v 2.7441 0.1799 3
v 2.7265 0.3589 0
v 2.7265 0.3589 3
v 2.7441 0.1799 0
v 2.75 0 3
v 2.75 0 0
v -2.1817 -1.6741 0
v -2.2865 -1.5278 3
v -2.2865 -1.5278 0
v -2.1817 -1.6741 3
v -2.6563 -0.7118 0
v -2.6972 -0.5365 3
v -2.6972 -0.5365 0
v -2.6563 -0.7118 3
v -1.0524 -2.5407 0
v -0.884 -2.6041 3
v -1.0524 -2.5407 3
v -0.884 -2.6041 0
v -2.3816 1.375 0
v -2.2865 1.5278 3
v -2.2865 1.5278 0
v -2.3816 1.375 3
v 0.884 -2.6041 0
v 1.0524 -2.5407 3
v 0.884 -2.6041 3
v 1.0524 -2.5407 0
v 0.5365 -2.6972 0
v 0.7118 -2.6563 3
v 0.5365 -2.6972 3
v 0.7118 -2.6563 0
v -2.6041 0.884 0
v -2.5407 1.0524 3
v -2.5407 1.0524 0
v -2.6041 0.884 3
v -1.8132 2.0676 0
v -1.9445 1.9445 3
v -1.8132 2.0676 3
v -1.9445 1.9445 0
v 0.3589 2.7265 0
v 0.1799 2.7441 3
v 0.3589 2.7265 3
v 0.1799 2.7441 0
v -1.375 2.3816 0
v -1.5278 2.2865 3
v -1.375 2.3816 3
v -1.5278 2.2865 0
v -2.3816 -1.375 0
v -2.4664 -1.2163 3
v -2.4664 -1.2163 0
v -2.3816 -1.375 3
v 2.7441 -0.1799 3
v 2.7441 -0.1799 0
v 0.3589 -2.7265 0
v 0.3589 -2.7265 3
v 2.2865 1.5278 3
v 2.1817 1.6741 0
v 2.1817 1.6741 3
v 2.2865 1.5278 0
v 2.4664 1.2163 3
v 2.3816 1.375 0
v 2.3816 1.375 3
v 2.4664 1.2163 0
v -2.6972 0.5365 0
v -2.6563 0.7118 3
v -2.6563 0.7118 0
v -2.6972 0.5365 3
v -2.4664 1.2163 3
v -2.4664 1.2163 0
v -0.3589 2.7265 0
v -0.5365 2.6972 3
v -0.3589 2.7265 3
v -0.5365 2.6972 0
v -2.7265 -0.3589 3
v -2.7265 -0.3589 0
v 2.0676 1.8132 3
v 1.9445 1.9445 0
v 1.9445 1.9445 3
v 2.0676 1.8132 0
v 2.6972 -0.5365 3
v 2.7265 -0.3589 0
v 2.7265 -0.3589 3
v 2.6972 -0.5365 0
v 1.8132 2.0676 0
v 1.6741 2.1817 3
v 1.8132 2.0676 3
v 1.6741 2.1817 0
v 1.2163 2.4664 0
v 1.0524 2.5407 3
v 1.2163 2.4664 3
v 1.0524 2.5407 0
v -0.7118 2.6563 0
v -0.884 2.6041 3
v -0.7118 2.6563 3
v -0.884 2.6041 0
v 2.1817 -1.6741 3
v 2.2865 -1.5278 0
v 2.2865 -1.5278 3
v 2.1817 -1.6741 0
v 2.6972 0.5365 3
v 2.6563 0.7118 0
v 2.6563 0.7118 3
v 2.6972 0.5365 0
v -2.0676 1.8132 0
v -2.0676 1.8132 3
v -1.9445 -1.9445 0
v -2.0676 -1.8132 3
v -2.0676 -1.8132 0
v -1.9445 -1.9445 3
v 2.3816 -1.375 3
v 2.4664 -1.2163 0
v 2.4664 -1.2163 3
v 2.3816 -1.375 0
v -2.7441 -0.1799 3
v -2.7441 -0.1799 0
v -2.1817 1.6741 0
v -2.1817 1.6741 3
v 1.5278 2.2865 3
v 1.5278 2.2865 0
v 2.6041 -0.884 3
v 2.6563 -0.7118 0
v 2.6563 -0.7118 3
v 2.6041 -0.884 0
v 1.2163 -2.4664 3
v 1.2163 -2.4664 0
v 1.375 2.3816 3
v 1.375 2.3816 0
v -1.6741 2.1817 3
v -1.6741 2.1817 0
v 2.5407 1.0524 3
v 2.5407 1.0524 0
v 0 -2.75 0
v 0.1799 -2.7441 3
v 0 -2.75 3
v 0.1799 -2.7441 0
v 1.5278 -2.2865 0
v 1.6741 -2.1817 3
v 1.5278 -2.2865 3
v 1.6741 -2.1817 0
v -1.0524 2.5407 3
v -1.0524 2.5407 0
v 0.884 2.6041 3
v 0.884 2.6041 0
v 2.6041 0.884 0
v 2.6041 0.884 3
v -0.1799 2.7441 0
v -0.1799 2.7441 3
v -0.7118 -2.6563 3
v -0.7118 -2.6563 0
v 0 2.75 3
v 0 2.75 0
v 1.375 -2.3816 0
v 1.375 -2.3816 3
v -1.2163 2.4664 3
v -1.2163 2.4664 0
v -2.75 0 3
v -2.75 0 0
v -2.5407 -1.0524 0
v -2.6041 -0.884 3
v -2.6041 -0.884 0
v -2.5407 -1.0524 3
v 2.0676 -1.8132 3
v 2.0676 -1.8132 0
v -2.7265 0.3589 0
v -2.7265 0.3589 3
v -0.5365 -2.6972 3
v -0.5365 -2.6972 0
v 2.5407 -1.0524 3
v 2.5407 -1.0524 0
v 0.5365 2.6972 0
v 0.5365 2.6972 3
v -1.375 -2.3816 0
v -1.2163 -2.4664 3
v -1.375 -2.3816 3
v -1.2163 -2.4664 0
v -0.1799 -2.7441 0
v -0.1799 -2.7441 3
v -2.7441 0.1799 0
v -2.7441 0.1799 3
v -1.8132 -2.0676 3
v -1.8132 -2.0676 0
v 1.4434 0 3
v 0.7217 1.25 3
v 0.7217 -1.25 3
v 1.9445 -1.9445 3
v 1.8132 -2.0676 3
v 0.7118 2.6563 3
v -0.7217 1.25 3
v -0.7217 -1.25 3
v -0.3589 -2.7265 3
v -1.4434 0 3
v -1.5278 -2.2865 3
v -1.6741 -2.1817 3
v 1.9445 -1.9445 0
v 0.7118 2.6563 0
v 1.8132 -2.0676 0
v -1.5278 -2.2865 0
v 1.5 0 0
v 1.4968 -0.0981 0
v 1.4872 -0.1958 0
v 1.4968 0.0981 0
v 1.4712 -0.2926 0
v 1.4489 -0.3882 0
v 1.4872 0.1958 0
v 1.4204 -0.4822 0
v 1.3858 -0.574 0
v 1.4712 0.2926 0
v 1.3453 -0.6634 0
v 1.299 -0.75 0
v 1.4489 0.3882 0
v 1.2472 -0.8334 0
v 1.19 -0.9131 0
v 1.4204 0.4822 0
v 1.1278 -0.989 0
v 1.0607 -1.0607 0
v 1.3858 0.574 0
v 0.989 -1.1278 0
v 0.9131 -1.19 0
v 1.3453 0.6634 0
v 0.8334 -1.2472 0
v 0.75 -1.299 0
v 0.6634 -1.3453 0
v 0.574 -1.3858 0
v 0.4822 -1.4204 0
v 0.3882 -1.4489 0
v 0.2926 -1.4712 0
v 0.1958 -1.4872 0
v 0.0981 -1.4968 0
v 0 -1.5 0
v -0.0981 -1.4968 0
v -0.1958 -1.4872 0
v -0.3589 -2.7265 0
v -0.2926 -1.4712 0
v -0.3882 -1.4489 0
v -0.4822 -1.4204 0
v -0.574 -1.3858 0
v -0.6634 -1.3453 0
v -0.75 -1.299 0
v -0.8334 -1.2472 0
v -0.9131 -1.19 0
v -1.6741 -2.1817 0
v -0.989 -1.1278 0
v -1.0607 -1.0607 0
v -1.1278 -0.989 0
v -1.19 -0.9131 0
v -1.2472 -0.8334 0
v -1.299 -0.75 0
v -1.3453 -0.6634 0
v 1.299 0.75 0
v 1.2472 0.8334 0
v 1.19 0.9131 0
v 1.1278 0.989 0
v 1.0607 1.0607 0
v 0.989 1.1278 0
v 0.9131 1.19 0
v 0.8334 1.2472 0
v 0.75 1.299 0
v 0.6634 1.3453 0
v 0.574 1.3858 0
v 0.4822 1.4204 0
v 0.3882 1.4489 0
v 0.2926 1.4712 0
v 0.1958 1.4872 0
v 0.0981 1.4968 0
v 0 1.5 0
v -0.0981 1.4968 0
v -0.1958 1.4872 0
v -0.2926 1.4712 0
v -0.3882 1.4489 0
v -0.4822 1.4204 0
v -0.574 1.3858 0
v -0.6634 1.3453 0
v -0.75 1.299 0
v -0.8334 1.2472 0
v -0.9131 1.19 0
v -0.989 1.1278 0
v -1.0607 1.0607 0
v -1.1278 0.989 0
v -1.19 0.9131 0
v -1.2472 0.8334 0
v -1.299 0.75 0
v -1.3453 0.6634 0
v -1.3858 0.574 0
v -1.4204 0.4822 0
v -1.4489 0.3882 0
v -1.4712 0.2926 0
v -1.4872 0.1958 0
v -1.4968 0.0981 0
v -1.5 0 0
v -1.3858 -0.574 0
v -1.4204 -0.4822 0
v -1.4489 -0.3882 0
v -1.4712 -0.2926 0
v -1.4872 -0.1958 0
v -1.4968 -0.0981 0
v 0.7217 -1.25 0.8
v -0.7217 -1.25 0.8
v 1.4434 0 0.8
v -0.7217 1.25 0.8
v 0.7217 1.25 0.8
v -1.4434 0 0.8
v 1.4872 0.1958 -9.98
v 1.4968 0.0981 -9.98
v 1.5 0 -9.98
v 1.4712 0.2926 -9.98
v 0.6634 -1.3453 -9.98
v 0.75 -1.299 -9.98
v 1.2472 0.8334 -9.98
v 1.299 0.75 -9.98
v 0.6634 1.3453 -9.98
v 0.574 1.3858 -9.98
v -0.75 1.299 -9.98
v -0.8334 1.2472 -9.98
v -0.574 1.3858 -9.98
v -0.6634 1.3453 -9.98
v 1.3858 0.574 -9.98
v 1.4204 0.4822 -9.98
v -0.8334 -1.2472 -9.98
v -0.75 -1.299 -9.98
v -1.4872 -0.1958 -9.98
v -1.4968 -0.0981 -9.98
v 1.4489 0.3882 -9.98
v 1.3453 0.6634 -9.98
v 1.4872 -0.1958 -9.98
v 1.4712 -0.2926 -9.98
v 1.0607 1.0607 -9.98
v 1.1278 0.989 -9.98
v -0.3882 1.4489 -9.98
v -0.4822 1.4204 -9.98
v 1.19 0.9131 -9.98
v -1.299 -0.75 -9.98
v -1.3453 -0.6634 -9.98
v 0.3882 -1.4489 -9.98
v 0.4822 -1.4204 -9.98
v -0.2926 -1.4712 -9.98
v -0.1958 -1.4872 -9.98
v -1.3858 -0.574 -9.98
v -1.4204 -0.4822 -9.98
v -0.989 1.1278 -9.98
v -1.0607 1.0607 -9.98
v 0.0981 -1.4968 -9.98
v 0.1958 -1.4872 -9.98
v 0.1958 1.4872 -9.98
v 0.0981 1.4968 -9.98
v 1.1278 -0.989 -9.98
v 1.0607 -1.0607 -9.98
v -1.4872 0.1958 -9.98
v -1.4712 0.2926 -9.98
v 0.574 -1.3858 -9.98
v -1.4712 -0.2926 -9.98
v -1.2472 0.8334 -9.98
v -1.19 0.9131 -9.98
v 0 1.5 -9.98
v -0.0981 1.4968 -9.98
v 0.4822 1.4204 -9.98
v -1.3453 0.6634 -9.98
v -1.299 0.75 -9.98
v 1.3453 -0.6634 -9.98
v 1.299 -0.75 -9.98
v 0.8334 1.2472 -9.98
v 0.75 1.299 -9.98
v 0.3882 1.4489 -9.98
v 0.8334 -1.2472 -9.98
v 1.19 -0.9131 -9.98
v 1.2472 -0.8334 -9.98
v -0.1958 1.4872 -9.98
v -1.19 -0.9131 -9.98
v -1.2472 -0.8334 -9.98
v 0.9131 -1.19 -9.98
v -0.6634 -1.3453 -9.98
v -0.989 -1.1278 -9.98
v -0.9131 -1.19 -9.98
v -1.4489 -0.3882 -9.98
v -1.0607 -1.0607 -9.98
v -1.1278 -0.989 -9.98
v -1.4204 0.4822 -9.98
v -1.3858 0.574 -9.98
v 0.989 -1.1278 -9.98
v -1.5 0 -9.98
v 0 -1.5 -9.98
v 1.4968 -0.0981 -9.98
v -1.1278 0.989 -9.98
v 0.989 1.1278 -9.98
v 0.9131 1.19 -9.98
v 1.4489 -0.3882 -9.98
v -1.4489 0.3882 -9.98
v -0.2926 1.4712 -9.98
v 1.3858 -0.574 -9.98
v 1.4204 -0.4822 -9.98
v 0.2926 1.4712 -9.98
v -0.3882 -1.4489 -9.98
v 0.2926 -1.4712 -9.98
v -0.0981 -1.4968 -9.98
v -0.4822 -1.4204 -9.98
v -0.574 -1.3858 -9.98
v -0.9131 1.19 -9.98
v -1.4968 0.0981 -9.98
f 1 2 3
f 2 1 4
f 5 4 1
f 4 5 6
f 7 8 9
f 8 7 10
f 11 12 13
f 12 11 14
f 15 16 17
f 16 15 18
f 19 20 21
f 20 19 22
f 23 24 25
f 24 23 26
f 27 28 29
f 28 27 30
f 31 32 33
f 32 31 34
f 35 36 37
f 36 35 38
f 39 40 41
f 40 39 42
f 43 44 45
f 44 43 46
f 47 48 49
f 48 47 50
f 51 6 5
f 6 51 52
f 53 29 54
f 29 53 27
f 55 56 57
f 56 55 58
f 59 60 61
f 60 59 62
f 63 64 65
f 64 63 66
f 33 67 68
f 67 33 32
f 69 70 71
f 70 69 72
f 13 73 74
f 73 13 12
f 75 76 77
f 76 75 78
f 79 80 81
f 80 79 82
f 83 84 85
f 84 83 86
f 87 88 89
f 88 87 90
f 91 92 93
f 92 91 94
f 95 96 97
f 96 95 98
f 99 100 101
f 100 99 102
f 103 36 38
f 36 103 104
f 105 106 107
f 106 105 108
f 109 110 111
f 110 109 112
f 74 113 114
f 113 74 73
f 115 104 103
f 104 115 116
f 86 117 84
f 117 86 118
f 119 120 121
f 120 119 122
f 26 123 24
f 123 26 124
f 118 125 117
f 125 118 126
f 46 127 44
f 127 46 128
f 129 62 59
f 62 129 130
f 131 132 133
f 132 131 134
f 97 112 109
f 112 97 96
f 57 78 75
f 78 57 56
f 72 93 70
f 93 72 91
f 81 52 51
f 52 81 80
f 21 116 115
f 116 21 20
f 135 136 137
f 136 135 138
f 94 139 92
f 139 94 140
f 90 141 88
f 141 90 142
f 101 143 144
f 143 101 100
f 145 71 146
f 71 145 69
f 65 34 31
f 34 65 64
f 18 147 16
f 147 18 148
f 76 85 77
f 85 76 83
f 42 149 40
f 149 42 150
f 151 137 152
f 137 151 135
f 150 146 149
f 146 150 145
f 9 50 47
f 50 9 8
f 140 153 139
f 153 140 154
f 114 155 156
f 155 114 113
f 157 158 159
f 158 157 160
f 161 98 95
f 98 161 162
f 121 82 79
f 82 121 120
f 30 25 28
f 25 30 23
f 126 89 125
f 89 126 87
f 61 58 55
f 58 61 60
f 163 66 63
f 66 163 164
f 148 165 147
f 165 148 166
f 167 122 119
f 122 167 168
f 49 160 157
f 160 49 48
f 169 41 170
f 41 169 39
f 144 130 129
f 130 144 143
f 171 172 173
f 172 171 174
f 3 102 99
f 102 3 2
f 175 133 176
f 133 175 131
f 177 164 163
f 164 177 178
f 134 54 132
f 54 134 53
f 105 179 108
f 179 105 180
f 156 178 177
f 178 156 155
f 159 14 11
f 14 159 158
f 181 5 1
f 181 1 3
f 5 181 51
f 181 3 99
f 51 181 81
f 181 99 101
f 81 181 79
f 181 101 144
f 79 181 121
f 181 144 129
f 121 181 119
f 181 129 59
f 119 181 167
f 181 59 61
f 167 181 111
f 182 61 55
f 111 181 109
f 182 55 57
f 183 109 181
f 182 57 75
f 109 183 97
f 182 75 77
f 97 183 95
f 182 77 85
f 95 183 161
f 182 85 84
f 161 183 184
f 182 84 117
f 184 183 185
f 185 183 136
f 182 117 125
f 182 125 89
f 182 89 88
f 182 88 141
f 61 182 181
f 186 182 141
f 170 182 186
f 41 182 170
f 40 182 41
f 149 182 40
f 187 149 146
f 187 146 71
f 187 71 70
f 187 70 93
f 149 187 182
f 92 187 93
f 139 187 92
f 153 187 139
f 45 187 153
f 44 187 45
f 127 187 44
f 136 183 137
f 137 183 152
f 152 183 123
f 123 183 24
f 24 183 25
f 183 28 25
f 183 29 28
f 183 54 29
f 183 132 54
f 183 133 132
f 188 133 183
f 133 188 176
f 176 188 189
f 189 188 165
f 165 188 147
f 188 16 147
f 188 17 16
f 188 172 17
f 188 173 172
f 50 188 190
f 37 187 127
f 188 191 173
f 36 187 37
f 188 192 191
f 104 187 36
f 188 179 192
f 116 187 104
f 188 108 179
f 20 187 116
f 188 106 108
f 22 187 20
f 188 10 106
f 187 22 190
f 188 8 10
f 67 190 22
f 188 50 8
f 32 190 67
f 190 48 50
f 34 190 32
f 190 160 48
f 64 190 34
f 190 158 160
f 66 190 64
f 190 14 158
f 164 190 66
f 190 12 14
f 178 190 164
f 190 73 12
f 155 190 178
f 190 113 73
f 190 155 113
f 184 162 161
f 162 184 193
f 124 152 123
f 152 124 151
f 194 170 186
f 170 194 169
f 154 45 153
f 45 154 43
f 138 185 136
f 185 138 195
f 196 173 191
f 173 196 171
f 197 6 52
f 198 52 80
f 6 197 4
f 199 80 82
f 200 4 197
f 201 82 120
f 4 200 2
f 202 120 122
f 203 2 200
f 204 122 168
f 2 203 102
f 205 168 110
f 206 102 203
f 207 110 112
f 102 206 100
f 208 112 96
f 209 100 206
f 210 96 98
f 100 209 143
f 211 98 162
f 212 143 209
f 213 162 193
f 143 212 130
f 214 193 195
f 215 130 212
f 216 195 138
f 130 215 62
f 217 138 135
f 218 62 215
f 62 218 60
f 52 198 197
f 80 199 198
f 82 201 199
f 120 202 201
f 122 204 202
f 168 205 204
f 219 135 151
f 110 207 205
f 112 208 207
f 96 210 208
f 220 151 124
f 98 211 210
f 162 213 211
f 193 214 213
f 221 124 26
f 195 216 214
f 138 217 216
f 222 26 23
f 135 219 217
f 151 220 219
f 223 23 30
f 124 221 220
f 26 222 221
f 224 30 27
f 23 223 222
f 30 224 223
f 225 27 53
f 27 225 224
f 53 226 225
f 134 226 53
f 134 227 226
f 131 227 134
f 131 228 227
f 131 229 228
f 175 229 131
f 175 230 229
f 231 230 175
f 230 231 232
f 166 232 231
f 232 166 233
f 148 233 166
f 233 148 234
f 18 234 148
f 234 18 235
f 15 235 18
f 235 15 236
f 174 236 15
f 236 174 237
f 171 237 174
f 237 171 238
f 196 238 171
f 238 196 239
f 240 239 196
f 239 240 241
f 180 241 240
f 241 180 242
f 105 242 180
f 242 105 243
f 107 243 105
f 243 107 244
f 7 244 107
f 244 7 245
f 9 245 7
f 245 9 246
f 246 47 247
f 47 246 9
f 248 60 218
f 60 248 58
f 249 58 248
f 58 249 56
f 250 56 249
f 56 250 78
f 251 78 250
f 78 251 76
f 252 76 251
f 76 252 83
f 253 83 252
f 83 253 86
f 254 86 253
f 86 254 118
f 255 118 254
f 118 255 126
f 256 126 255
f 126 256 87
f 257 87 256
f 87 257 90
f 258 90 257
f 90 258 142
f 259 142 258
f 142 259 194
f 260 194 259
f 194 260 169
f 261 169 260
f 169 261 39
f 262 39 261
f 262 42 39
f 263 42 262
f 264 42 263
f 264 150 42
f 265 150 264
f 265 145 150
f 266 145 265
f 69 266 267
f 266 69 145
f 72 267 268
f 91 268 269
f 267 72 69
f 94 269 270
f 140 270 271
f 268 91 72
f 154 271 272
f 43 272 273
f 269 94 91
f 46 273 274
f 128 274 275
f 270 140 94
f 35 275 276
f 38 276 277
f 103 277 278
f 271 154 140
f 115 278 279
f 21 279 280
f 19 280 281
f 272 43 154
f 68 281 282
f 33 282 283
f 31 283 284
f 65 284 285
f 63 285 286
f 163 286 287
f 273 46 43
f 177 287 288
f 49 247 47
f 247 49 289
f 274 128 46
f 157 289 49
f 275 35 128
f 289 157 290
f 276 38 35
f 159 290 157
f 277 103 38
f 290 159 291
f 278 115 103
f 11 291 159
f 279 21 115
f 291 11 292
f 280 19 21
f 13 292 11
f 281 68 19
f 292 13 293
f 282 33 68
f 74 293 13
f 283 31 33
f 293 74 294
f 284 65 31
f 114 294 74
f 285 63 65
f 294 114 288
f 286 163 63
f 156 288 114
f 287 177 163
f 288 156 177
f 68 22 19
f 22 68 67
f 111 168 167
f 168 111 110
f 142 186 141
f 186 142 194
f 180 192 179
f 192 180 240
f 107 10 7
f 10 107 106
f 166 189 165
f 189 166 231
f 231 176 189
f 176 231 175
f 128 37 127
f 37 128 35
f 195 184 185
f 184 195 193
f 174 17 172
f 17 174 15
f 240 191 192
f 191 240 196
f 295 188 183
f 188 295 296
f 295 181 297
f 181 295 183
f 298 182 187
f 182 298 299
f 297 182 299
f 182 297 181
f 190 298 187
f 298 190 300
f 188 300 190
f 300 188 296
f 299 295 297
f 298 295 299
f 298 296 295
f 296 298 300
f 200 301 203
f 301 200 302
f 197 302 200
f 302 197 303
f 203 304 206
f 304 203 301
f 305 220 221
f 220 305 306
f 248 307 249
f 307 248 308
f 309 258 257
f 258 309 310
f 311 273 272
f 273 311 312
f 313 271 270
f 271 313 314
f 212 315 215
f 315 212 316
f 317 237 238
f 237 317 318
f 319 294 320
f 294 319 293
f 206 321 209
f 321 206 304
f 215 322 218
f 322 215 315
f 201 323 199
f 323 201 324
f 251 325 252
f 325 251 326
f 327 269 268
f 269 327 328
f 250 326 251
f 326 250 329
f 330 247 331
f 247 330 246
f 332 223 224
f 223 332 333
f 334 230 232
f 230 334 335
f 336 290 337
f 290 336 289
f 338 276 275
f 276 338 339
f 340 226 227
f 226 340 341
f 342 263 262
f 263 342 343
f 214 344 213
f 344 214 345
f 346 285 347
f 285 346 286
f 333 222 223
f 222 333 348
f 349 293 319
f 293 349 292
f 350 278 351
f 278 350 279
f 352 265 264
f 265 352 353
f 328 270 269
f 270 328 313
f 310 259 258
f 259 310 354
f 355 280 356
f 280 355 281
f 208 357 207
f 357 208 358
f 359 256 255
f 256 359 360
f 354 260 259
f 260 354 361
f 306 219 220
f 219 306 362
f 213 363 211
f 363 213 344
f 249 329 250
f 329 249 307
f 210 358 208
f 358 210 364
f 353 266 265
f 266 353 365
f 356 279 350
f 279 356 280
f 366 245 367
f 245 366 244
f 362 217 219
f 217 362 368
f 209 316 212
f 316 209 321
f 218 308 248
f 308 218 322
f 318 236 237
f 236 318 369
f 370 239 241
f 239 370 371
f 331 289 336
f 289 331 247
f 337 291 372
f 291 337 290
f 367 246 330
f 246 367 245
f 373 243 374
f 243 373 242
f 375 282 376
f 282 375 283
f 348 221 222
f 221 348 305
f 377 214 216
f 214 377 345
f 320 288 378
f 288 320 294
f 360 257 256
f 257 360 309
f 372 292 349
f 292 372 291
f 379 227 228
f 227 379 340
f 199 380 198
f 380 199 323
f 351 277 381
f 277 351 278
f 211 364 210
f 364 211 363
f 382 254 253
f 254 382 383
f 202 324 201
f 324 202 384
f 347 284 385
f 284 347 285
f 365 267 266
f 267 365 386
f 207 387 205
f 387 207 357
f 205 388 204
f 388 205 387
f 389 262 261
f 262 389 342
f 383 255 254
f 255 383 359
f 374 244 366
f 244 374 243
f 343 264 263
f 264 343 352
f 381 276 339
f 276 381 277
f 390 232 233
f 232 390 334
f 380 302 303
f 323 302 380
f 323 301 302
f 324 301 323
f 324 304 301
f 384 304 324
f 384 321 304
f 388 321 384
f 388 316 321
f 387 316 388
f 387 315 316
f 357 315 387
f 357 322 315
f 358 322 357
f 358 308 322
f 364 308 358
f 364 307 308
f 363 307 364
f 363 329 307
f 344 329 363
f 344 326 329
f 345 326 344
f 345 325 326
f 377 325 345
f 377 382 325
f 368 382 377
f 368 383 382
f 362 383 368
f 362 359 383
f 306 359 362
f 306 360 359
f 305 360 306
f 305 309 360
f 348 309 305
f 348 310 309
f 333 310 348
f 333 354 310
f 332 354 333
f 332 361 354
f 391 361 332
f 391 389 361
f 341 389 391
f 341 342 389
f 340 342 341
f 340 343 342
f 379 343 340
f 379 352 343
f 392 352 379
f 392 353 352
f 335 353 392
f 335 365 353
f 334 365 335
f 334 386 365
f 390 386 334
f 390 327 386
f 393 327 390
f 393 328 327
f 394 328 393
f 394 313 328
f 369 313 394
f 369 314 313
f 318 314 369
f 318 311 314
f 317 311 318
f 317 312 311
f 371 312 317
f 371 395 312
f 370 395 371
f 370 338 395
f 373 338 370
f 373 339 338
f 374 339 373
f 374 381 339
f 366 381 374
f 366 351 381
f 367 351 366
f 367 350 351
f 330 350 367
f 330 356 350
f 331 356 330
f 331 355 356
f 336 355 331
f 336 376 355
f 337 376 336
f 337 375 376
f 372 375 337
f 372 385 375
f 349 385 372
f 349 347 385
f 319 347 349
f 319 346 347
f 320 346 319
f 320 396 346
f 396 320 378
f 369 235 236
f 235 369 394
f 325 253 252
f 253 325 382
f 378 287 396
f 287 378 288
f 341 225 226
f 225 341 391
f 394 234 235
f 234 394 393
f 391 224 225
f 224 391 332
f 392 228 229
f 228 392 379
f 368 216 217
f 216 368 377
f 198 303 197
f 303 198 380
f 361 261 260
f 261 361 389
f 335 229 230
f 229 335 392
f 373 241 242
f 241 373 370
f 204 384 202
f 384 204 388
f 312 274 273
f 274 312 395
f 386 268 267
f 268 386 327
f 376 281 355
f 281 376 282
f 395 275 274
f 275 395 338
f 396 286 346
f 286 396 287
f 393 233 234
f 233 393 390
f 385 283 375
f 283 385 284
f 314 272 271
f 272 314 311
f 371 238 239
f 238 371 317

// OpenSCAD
// Socket head cap screw (M3-ish) — dimensions in mm
thread_diameter = 3.0;     // shank major diameter
overall_length  = 10.0;    // length under head
head_diameter   = 5.5;     // cylindrical head diameter
head_height     = 3.0;     // head height
hex_socket_af   = 2.5;     // hex socket across flats
socket_depth    = 2.2;     // typical depth (kept < head_height)

$fn = 96;

// Hex prism sized by across-flats (AF)
module hex_prism_af(af, h) {
    // For a regular hex: AF = 2 * apothem; circumradius R = AF / sqrt(3)
    cylinder(h = h, r = af / sqrt(3), $fn = 6);
}

module socket_head_cap_screw() {
    eps = 0.02;

    union() {
        // Head with internal hex socket
        difference() {
            // Head sits from z=0 to z=head_height
            cylinder(h = head_height, d = head_diameter);

            // Socket cut from top face downward
            translate([0, 0, head_height - socket_depth])
                hex_prism_af(hex_socket_af, socket_depth + eps);
        }

        // Shank (connected to underside of head at z=0)
        translate([0, 0, -overall_length + eps])  // slight overlap into head for watertight union
            cylinder(h = overall_length, d = thread_diameter);
    }
}

socket_head_cap_screw();
